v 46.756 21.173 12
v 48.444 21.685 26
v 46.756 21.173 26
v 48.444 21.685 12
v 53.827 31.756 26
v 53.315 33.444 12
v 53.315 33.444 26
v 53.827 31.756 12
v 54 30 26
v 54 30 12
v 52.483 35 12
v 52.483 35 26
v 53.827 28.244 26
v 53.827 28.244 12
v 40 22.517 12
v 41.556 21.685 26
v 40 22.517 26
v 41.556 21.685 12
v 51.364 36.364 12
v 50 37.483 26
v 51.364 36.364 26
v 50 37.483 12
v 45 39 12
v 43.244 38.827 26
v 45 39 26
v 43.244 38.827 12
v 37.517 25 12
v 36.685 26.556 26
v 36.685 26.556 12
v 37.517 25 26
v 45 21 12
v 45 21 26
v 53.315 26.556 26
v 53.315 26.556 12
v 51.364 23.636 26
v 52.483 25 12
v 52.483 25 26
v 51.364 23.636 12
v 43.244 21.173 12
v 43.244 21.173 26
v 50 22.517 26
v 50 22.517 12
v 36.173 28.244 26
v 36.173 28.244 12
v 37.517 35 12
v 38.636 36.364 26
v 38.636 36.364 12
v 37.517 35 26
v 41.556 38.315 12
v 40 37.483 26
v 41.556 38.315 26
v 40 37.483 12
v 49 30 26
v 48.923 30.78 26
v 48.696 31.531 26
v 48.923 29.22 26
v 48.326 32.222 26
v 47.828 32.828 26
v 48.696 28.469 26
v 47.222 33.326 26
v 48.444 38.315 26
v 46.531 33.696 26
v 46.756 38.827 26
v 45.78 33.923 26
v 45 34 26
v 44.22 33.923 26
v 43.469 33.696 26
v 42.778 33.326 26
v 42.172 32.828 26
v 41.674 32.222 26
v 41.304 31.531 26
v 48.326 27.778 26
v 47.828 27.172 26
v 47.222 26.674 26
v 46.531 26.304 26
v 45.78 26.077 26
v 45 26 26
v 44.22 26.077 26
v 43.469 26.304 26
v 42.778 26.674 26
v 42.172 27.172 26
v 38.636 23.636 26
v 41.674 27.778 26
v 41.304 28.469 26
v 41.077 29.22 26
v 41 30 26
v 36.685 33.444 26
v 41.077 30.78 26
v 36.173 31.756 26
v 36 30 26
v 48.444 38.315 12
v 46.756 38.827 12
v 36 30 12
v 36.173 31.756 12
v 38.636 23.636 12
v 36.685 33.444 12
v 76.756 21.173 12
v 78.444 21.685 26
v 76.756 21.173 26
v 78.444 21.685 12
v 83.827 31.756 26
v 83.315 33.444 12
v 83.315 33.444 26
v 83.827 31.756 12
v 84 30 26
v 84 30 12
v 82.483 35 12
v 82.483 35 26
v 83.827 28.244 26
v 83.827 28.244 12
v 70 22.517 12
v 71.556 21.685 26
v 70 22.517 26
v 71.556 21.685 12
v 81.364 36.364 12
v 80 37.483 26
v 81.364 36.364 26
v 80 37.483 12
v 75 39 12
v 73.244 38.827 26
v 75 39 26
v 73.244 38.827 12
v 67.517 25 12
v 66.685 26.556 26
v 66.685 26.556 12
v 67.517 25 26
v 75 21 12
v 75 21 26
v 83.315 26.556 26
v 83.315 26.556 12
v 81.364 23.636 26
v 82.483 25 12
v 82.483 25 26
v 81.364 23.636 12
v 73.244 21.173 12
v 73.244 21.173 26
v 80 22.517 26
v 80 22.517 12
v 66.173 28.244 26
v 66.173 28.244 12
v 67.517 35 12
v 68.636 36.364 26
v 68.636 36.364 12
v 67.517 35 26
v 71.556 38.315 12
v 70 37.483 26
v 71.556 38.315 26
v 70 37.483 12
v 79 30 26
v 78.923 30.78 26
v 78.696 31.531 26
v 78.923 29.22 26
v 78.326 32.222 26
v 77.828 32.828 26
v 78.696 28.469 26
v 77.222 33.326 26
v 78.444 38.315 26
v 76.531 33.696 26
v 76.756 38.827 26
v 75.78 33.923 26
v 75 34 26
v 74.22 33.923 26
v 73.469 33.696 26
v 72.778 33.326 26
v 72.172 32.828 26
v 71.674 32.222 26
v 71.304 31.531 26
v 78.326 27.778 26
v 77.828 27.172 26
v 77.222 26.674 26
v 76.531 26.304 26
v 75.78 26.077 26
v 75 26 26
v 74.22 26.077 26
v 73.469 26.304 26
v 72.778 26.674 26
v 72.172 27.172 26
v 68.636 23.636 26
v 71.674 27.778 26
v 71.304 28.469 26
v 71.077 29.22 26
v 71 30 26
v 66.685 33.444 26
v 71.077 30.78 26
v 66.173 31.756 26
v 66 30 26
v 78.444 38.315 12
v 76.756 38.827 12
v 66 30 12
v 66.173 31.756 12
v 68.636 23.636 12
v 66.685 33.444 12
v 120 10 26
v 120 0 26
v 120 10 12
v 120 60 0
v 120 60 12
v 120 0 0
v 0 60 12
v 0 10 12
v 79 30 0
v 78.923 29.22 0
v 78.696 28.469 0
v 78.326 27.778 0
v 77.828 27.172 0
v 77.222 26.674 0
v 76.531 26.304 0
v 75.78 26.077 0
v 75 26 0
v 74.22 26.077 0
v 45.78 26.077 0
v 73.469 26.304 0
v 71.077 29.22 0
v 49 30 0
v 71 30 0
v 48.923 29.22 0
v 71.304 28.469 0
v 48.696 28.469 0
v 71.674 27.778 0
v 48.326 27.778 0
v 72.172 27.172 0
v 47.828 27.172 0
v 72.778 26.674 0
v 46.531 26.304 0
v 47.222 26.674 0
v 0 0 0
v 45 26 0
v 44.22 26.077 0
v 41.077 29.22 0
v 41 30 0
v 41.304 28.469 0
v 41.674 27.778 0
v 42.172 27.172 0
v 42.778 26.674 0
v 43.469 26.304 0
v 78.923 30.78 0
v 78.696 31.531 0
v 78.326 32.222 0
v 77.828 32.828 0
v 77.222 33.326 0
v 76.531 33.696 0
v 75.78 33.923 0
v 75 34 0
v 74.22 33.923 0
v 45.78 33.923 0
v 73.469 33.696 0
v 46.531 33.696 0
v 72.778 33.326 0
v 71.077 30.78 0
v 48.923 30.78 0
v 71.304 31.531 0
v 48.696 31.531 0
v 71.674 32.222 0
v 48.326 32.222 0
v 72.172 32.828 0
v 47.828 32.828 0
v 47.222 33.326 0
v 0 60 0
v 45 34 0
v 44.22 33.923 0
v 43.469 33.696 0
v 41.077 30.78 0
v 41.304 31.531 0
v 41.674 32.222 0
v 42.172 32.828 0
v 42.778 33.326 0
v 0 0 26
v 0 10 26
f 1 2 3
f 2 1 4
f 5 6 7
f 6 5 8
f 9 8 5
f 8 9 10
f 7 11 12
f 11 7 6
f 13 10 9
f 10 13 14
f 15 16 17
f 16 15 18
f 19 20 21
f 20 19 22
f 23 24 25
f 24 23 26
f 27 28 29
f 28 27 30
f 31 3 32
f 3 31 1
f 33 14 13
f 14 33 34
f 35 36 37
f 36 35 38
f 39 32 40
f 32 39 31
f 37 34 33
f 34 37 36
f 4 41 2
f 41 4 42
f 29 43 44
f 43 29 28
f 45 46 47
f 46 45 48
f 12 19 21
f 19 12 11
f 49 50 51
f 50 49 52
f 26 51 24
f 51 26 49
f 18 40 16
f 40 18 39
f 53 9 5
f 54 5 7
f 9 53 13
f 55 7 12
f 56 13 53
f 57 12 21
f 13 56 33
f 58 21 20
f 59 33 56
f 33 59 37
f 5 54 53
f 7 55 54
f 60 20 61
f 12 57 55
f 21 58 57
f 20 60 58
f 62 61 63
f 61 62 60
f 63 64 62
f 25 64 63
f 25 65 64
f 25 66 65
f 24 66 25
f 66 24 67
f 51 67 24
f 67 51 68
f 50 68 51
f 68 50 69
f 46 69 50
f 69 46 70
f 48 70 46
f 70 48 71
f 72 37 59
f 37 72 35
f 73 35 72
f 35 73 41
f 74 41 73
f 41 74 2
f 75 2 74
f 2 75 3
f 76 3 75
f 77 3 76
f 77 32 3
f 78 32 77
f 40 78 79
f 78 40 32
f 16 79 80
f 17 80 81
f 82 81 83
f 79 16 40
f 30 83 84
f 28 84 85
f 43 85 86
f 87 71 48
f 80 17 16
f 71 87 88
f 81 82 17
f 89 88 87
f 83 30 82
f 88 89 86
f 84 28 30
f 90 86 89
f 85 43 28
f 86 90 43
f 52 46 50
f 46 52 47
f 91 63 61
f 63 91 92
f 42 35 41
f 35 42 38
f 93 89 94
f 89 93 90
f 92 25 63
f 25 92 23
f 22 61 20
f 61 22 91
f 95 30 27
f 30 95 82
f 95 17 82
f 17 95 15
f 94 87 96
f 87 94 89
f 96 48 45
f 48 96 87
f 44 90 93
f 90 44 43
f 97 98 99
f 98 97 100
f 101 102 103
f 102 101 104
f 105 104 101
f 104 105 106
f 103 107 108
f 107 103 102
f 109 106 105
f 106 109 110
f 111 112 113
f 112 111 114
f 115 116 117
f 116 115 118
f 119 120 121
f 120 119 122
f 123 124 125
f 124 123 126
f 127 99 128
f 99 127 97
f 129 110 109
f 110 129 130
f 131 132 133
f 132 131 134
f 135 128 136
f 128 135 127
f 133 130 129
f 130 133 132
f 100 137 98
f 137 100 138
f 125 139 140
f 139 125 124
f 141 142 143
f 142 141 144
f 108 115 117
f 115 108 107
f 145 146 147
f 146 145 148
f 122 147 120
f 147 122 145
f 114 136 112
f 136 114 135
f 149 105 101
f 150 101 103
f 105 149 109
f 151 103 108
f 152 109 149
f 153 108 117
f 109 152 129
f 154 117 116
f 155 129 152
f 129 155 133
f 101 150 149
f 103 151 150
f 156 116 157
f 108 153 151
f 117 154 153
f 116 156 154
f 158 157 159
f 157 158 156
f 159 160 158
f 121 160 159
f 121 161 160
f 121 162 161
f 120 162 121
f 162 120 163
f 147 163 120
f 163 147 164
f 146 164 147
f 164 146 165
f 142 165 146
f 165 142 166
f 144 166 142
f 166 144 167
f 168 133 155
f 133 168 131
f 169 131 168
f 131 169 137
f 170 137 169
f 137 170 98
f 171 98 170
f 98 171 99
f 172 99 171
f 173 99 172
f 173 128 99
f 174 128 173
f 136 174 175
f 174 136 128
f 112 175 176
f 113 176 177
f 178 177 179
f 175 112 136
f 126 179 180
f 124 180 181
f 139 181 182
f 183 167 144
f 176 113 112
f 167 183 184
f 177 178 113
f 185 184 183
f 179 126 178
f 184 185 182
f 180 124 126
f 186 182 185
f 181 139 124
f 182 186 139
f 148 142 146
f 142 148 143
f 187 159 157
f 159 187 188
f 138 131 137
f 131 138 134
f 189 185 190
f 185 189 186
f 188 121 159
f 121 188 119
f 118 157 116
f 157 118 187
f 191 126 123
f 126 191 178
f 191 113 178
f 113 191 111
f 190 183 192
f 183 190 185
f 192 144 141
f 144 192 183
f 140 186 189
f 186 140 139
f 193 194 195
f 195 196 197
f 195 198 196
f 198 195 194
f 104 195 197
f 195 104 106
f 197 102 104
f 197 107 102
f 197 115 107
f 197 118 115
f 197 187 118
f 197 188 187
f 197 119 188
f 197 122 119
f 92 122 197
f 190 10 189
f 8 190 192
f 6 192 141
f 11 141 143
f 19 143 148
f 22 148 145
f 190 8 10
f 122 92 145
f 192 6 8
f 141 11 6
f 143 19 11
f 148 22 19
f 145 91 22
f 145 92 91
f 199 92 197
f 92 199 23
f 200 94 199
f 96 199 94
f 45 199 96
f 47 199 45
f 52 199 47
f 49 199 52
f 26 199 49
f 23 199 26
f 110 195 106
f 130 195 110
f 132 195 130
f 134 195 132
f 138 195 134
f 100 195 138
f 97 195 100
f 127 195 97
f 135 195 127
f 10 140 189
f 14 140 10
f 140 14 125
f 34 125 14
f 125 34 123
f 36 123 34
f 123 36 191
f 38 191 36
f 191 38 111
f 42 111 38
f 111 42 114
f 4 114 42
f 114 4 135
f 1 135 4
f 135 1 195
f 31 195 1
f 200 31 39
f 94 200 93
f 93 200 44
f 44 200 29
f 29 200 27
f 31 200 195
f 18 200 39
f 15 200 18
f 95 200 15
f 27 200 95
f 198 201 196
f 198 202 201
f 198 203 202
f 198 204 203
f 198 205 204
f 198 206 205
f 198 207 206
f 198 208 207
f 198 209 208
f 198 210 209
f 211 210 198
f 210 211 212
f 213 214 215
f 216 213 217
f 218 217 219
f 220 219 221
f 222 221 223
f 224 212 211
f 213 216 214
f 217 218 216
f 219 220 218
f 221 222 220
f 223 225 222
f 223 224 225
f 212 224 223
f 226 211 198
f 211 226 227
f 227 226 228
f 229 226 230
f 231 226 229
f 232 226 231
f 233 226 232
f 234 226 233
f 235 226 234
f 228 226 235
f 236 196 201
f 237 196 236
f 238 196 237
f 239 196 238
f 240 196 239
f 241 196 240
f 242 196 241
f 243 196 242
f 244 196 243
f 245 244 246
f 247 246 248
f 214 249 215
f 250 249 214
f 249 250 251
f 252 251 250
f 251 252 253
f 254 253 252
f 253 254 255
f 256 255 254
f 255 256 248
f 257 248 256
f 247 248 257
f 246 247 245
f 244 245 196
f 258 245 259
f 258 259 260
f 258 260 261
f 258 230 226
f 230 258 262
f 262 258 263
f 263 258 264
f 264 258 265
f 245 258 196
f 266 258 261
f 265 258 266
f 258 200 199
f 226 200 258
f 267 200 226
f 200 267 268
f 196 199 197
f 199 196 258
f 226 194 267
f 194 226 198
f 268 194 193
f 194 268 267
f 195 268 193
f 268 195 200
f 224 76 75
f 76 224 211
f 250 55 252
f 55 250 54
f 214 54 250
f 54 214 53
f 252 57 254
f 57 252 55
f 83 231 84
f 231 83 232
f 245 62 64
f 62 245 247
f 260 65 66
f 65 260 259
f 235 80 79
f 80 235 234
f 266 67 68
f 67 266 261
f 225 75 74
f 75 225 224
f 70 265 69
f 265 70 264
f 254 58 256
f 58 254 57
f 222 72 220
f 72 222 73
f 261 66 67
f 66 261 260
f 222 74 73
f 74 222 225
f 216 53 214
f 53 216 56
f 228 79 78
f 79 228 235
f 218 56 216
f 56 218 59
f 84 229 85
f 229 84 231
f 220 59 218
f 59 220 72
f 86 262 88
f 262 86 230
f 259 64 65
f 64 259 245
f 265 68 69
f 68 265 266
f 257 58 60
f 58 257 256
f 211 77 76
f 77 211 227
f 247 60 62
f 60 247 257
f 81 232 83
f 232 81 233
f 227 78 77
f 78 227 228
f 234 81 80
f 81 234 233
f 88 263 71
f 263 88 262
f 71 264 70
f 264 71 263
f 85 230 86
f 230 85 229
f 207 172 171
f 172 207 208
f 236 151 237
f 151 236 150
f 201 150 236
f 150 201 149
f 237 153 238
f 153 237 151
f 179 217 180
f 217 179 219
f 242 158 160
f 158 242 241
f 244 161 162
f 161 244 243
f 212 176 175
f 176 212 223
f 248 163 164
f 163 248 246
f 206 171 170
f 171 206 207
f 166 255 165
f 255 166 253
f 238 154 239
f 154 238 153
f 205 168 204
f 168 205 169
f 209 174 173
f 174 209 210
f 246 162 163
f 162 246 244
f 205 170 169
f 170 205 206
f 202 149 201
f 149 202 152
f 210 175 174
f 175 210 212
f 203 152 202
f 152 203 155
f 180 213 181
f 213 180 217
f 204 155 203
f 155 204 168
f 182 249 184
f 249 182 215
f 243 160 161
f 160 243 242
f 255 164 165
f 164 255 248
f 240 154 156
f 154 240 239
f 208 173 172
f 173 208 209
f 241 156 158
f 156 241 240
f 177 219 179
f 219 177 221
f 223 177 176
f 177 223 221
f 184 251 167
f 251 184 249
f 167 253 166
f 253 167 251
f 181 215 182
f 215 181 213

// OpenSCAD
$fn = 32;

// ----------------------------------------------------------------------
// Drill jig: fence jig
// ----------------------------------------------------------------------

// --- parameters (mm) ---
plate_l = 120;            // plate length, X
plate_w = 60;             // plate width, Y
plate_t = 12;             // plate thickness
boss_d = 18;              // guide boss diameter
boss_h = 15;              // boss height above the plate
guide_d = 8;              // guide hole diameter
boss_pitch = 30;          // boss pitch
fence_h = 15;             // fence height above the plate
fence_t = 10;             // fence thickness
fit_tol = 0.05;           // tolerance for press fits, mm
free_tol = 0.3;           // tolerance for clearance fits, mm

n_boss = 2;  // guide bosses
boss_x0 = (plate_l - (n_boss - 1) * boss_pitch) / 2;  // first boss X
boss_top = plate_t - 1 + boss_h;  // boss crown height
fence_top = plate_t - 1 + fence_h;  // fence crown height
total_h = max([fence_top, boss_top]);  // overall height

difference() {
  union() {
  cube([plate_l, plate_w, plate_t]);
  for (i = [0 : n_boss - 1])
    translate([boss_x0 + i * boss_pitch, plate_w / 2, plate_t - 1])
      cylinder(h = boss_h, d = boss_d);
  translate([0, 0, plate_t - 1]) cube([plate_l, fence_t, fence_h]);
  }
  for (i = [0 : n_boss - 1])
    translate([boss_x0 + i * boss_pitch, plate_w / 2, -1])
      cylinder(h = plate_t + boss_h, d = guide_d);
}
